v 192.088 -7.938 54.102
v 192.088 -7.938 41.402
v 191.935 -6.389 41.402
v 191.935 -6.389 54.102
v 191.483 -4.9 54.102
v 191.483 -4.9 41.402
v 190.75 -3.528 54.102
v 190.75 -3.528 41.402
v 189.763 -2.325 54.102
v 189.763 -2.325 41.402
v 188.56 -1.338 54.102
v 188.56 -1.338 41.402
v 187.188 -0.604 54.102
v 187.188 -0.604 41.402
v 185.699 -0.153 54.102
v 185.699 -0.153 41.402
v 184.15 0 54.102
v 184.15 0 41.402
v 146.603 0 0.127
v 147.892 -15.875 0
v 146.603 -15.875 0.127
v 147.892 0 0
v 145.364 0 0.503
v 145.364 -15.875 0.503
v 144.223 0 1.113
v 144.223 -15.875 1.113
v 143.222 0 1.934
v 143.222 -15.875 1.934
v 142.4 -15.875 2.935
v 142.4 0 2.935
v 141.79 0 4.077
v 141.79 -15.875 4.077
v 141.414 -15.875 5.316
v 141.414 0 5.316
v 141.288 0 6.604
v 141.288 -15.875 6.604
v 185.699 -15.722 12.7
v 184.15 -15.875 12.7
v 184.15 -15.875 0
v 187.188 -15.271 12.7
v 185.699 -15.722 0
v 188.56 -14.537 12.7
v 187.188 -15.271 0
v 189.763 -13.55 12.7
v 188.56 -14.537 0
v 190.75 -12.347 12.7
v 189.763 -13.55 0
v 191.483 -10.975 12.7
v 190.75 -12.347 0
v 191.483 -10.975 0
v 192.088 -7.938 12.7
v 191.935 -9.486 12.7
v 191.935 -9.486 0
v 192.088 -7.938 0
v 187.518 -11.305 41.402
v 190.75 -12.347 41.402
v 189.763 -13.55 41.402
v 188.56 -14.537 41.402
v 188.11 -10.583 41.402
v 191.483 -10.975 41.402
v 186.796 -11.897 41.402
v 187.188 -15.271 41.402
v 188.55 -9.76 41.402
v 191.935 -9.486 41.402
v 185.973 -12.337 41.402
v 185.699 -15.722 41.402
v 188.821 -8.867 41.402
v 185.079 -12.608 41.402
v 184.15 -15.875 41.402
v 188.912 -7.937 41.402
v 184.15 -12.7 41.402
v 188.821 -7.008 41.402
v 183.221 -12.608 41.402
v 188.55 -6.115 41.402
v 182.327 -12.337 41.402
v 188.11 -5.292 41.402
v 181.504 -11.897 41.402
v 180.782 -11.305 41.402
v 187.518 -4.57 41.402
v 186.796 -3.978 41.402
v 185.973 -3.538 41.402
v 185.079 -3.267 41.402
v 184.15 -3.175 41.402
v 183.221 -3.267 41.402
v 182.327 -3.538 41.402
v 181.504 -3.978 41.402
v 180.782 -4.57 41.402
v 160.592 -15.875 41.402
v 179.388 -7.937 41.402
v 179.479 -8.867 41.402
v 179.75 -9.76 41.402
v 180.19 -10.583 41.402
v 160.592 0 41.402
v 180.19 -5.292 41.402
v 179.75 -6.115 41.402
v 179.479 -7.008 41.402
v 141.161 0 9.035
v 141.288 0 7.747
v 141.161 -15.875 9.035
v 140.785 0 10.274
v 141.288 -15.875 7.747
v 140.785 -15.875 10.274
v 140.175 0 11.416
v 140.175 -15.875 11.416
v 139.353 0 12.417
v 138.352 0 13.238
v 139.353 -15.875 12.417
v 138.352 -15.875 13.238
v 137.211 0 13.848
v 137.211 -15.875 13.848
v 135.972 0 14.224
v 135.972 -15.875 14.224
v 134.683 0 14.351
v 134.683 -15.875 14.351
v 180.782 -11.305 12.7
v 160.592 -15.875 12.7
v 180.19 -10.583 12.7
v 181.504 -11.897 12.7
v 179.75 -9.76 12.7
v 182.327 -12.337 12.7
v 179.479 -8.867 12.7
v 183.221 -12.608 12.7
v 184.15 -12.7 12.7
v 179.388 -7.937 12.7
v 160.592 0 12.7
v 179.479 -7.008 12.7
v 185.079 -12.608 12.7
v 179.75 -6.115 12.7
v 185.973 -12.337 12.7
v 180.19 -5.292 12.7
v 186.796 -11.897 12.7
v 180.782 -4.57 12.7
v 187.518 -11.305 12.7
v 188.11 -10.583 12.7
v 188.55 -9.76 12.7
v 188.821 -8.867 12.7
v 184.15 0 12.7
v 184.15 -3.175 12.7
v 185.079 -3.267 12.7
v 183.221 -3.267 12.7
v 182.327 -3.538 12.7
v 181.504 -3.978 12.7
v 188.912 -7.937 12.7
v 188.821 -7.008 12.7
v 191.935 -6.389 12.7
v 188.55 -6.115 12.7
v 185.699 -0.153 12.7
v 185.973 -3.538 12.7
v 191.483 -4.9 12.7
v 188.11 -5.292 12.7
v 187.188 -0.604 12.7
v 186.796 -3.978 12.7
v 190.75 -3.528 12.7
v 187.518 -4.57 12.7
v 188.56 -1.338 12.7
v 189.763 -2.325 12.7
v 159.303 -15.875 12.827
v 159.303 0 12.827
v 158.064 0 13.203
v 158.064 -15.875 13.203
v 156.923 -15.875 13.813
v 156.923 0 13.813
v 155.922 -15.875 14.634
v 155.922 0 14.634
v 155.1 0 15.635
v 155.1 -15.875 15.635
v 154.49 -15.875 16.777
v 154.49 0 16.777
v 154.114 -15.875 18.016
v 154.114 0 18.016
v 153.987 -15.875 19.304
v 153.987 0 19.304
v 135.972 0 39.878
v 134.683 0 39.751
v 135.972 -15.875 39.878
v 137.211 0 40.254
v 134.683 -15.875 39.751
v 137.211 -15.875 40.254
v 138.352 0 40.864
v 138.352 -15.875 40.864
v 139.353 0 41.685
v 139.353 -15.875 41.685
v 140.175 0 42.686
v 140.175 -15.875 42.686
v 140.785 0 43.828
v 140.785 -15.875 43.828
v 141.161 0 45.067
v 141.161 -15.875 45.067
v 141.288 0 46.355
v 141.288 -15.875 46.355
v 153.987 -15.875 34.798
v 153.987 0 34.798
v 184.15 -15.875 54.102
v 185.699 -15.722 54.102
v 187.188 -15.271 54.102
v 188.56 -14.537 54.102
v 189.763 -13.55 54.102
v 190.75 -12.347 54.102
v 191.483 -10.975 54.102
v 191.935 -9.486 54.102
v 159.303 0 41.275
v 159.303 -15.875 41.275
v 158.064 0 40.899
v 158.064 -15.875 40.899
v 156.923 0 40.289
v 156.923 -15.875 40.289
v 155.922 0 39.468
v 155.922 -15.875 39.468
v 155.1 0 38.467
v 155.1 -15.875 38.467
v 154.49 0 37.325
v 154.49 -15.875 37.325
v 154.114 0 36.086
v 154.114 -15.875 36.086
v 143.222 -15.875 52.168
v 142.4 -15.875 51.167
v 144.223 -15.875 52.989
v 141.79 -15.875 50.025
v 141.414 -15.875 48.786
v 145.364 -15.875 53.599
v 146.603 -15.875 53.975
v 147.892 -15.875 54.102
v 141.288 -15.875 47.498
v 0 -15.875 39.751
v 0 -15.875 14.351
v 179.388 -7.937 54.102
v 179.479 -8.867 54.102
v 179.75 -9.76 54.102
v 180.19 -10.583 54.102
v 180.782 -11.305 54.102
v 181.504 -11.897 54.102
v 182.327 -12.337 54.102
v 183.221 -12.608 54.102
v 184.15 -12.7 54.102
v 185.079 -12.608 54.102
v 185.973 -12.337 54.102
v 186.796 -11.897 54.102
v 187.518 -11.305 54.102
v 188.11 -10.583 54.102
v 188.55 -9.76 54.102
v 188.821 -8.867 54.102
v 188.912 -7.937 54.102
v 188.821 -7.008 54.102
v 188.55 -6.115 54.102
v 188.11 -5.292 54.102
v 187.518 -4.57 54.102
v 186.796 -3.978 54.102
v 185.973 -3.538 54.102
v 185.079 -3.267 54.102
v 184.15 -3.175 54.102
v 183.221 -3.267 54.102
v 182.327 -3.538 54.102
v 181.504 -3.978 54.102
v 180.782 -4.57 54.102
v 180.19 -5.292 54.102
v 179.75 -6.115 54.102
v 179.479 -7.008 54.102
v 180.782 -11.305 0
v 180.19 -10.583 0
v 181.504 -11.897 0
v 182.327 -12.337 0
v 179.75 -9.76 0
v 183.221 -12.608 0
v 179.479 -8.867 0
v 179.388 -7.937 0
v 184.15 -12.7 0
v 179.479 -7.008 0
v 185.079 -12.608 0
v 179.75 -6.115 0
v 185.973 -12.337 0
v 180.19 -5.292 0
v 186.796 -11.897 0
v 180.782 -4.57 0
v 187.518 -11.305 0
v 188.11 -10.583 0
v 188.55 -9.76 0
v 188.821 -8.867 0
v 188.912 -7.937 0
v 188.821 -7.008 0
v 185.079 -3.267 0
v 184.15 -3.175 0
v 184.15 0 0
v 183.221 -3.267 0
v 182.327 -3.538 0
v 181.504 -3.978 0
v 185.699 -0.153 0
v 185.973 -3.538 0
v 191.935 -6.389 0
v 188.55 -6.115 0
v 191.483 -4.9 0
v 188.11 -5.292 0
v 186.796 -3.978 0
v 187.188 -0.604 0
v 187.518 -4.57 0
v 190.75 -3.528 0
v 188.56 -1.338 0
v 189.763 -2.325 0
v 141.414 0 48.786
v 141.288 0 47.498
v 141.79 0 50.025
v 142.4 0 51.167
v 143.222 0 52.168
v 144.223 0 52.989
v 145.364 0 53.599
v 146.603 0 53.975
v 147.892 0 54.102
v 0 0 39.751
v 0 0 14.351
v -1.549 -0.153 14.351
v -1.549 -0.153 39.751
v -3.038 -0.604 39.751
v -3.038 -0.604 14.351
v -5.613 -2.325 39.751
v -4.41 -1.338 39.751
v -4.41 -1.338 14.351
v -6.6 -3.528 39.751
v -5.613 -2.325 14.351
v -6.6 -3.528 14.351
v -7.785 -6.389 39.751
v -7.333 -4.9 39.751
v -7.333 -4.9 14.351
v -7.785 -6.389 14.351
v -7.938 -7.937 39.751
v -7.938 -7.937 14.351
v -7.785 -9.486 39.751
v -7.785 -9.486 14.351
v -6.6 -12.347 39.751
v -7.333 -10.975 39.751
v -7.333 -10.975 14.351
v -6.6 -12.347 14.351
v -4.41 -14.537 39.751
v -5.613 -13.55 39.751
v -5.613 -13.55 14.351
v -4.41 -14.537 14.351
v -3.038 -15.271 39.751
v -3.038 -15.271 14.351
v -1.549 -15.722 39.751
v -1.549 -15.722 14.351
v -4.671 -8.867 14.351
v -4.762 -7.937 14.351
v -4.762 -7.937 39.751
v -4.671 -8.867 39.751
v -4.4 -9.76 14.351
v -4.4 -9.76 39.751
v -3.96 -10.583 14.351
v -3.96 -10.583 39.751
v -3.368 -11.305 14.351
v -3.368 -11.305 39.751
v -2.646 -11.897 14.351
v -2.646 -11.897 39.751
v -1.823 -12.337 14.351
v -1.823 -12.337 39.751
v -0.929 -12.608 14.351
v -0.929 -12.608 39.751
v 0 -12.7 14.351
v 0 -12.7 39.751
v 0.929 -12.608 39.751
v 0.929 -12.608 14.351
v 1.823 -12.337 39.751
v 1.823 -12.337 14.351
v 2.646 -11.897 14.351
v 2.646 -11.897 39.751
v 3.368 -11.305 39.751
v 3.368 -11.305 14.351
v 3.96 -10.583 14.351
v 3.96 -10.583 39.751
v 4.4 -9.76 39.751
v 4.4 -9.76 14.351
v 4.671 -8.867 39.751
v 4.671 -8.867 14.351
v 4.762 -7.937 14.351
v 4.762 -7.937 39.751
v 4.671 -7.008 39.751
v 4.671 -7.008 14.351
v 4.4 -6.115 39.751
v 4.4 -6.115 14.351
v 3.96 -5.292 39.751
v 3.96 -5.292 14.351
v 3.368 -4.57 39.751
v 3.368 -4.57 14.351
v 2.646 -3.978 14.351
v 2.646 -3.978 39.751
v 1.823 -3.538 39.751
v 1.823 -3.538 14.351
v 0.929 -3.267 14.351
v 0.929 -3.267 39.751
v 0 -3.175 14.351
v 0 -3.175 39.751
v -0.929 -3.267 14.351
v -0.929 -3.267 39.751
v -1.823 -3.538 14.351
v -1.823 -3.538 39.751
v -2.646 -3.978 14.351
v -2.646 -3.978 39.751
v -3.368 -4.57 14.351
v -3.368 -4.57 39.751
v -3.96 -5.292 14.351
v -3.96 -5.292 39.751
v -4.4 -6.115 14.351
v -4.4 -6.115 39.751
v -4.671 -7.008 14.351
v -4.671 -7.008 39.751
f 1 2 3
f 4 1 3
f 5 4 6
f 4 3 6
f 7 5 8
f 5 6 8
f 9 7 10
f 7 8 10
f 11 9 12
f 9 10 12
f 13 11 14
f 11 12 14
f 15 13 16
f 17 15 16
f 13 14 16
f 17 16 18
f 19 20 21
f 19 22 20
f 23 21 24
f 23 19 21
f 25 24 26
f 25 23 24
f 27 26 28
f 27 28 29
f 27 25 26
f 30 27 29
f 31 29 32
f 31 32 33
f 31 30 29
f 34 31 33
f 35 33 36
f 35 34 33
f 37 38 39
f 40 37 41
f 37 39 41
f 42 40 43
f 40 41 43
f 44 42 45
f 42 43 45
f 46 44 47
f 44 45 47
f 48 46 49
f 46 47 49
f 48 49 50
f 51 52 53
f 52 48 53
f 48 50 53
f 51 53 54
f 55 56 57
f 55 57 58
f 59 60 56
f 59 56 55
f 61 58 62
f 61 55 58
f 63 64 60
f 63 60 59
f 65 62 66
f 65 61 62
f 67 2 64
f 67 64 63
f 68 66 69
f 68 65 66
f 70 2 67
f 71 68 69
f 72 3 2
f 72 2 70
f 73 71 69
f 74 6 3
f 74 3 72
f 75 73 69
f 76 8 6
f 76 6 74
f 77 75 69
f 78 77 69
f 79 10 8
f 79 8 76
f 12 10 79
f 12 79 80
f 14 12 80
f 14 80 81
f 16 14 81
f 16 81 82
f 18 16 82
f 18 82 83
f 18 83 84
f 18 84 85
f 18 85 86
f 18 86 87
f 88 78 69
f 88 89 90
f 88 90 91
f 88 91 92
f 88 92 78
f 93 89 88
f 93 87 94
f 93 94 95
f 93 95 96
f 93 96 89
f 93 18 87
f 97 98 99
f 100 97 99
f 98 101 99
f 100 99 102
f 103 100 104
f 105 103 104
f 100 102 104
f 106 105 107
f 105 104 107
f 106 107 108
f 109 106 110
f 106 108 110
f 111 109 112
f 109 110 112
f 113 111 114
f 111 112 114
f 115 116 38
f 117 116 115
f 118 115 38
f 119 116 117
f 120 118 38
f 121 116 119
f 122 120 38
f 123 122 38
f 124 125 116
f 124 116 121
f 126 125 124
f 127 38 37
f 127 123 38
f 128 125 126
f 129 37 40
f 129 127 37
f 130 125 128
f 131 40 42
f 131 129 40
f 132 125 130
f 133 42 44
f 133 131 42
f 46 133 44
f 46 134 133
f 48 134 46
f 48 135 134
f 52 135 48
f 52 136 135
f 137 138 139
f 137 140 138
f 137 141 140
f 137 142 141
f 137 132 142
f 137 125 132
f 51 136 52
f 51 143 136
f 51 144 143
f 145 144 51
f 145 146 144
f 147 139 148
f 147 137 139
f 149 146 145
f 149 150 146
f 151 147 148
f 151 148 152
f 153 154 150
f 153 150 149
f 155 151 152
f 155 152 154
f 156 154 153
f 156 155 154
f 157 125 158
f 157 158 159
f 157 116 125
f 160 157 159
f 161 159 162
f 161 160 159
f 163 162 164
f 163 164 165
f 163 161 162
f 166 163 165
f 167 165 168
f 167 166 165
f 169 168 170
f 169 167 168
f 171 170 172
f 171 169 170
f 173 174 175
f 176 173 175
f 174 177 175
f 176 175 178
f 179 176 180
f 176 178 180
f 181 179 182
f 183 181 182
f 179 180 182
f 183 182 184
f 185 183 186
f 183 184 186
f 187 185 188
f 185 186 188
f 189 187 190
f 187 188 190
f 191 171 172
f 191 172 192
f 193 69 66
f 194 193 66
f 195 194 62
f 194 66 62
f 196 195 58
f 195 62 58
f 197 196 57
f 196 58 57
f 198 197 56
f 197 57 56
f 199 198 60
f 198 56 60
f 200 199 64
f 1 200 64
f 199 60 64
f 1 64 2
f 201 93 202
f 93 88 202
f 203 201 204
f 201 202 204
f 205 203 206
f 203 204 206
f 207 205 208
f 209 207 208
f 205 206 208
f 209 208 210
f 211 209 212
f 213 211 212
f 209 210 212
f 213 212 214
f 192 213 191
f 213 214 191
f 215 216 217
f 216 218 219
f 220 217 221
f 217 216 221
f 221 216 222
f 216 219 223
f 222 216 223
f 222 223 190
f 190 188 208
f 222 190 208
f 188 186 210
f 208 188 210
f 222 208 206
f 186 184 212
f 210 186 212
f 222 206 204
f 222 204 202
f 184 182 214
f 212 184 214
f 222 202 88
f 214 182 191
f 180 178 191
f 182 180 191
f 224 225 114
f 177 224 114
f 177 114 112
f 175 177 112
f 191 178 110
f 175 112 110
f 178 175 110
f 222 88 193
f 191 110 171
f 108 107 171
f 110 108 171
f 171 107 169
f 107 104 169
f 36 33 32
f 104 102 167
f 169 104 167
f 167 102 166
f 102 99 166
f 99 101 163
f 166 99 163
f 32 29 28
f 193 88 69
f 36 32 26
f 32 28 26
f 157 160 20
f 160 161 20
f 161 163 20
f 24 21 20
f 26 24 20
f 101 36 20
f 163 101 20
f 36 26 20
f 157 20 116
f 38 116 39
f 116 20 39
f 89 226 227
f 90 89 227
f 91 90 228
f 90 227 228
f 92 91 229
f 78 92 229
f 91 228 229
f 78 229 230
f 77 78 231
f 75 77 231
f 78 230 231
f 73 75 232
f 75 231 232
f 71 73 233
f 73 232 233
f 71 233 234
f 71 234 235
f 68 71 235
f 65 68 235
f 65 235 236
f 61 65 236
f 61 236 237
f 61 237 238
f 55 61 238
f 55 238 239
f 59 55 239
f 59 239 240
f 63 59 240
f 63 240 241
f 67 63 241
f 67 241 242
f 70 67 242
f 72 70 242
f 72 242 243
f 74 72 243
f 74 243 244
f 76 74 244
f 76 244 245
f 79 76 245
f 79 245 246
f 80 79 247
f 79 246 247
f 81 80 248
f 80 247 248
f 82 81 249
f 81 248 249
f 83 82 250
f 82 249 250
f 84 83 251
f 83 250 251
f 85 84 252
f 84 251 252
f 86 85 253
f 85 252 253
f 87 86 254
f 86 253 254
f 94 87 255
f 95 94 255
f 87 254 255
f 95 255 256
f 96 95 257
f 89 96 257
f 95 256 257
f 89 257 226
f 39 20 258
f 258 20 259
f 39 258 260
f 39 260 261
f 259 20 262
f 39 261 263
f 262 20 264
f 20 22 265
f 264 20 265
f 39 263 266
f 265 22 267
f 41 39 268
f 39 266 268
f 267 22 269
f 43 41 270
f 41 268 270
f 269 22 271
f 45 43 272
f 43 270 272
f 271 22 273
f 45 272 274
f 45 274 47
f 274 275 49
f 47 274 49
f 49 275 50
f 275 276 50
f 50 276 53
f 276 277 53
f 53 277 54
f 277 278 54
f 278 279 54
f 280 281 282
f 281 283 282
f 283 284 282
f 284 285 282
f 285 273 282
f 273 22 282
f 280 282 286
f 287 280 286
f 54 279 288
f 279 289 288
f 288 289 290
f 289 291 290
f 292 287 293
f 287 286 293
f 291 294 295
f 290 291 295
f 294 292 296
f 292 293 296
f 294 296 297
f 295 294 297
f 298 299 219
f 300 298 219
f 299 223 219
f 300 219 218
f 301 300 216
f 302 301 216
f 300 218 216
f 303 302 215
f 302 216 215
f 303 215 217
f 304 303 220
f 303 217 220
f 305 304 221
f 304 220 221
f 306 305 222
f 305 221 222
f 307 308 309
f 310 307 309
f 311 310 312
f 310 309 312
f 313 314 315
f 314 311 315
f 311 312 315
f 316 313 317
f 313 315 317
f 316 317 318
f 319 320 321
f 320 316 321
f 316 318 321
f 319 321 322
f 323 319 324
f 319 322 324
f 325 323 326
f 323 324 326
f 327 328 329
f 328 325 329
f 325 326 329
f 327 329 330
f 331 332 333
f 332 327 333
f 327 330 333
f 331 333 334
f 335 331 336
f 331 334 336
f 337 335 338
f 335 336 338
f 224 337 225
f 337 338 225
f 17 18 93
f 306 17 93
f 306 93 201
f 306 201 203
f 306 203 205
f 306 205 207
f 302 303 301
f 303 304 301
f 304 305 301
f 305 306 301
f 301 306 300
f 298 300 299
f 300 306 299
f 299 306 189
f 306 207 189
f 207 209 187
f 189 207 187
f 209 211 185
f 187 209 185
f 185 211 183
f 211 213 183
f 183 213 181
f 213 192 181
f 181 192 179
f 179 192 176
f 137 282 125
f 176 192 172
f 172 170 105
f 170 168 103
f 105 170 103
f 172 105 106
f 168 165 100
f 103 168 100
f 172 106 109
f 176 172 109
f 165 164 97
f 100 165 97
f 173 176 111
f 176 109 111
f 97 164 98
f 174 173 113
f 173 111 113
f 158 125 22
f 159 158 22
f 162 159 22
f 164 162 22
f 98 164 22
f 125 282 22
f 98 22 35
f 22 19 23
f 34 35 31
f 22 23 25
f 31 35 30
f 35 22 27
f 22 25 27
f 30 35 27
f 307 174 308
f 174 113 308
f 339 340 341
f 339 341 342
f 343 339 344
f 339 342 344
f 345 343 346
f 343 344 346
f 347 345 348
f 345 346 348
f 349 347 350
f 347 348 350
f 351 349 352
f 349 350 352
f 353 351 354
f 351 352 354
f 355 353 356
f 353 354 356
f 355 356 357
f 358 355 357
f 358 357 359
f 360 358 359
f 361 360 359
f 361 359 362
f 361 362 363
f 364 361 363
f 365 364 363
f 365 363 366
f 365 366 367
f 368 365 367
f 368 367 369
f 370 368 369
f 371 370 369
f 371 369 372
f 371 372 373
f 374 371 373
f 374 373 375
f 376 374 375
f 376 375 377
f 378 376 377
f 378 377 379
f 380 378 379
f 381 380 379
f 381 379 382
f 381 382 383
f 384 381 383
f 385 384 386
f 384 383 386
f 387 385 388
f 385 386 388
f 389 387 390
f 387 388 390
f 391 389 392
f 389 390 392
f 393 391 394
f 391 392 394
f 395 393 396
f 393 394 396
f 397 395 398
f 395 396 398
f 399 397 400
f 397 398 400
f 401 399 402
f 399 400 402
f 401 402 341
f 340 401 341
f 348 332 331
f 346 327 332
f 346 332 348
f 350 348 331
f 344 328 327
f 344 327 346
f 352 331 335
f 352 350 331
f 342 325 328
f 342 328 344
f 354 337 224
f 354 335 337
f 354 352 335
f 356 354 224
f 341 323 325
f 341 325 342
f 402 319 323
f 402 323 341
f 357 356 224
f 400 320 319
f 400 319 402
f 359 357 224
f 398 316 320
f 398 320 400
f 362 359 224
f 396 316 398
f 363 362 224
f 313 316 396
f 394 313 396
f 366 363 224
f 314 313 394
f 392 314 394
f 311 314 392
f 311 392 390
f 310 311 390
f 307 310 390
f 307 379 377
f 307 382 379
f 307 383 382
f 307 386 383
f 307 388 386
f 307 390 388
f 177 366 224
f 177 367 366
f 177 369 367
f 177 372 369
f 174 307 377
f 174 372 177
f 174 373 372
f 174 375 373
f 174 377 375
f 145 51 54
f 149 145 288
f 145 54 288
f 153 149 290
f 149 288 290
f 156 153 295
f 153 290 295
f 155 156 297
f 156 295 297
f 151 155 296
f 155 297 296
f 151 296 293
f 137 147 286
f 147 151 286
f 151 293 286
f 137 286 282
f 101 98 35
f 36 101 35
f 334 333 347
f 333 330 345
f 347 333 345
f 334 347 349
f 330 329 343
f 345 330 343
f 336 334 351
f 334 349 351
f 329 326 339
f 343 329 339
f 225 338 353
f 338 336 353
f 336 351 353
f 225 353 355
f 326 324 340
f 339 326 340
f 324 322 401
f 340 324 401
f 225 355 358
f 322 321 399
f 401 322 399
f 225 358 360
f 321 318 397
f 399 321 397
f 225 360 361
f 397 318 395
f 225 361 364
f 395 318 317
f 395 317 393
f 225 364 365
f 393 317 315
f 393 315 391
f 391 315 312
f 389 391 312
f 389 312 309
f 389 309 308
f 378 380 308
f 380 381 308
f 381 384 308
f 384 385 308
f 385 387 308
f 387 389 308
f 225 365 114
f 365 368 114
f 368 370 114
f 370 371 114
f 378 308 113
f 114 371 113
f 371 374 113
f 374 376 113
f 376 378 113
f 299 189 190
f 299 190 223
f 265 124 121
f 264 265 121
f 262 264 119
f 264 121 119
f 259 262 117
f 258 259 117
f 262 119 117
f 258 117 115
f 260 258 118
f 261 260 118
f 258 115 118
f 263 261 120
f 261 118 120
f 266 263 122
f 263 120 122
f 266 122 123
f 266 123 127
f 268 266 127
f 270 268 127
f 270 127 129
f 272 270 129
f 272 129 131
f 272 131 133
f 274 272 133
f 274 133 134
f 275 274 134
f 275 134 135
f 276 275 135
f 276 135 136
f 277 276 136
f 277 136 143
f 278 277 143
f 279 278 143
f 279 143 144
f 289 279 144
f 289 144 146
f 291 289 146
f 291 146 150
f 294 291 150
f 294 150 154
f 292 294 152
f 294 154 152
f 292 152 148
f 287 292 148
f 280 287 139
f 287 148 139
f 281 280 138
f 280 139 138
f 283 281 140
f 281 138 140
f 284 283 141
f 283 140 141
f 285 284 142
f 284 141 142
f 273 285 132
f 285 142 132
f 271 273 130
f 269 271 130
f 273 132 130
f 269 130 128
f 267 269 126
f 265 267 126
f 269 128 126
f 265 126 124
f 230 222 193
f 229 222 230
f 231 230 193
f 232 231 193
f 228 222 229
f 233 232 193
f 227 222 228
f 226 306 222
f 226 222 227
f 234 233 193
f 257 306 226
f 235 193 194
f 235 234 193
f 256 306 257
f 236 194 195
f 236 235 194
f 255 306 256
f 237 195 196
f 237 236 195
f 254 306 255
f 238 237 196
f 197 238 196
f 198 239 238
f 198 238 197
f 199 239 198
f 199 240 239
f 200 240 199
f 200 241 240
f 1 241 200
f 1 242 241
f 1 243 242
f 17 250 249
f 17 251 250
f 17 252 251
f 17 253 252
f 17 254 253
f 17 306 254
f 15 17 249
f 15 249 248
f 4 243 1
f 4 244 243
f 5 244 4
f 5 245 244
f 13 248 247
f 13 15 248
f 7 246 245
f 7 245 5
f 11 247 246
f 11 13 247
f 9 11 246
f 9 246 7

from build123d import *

# Parameters (mm, degrees)
F1_DEPTH = 54.102
F2_D     = 9.525
F3_W     = 25.4
F3_H     = 28.702
F3_W_2   = 38.1
F4_DEPTH = 25.4
F5_R     = 6.604
F6_W     = 141.2875
F6_H     = 14.351
F6_W_2   = 7.9375
F7_DEPTH = 25.4
F9_R     = 6.604


# Not quite as in the source:
# - a pattern or mirror of a feature is missing from the dataset's text; its kind, count and spacing are read off the source's solid


with BuildPart() as f1:
    # F0 (on Top) → F1 (new body)
    with BuildSketch(Plane.XY):
        with BuildLine():
            ThreePointArc((192.0875, -7.9375), (189.7626600757, -2.3248399243), (184.15, 0))
            Line((184.15, 0), (184.15, -15.875))
            ThreePointArc((184.15, -15.875), (189.7626600757, -13.5501600757), (192.0875, -7.9375))
        make_face()
        with BuildLine():
            Line((184.15, -15.875), (184.15, 0))
            ThreePointArc((184.15, 0), (176.2125, -7.9375), (184.15, -15.875))
        make_face()
        with BuildLine():
            Line((184.15, 0), (0, 0))
            ThreePointArc((0, 0), (5.6126600757, -2.3248399243), (7.9375, -7.9375))
            ThreePointArc((7.9375, -7.9375), (5.6126600757, -13.5501600757), (0, -15.875))
            Line((0, -15.875), (184.15, -15.875))
            ThreePointArc((184.15, -15.875), (176.2125, -7.9375), (184.15, 0))
        make_face()
        with BuildLine():
            ThreePointArc((7.9375, -7.9375), (5.6126600757, -2.3248399243), (0, 0))
            Line((0, 0), (0, -15.875))
            ThreePointArc((0, -15.875), (5.6126600757, -13.5501600757), (7.9375, -7.9375))
        make_face()
        with BuildLine():
            Line((0, -15.875), (0, 0))
            ThreePointArc((0, 0), (-7.9375, -7.9375), (0, -15.875))
        make_face()
    extrude(amount=F1_DEPTH)

    # F2 (through all)
    with Locations(Plane(origin=(0, 0, 0), x_dir=(1, 0, 0), z_dir=(0, 0, -1))):
        with Locations((0, 7.9375), (184.15, 7.9375)):
            Hole(F2_D / 2)

    # F3 (on Front) → F4 (cut)
    with BuildSketch(Plane.XZ):
        with Locations((204.7875, 27.051)):
            Rectangle(F3_W, F3_H)
        with Locations((173.0375, 27.051)):
            Rectangle(F3_W_2, F3_H)
    extrude(amount=F4_DEPTH, mode=Mode.SUBTRACT)

    # F5
    f5_edges = [f1.edges().sort_by_distance(p)[0] for p in [
        (153.9875, -7.9375, 41.402),
        (153.9875, -7.9375, 12.7),
    ]]
    fillet(f5_edges, radius=F5_R)

    # F6 (on Front) → F7 (cut)
    with BuildSketch(Plane.XZ):
        with Locations((70.64375, 46.9265)):
            Rectangle(F6_W, F6_H)
        with Locations((-3.96875, 46.9265)):
            Rectangle(F6_W_2, F6_H)
        Polygon((-20.6375, 39.751), (-7.9375, 39.751), (-7.9375, 54.102), (0, 54.102), (141.2875, 54.102), (141.2875, 66.802), (-20.6375, 66.802), align=None)
    f7 = extrude(amount=F7_DEPTH, mode=Mode.SUBTRACT)

    # F7_copies: F7 across plane
    add(f7.mirror(Plane(origin=(0, 0, 27.051), x_dir=(-1, 0, 0), z_dir=(0, 0, -1))), mode=Mode.SUBTRACT)

    # F9
    f9_edges = [f1.edges().sort_by_distance(p)[0] for p in [
        (141.2875, -7.9375, 39.751),
        (141.2875, -7.9375, 54.102),
        (141.2875, -7.9375, 0),
        (141.2875, -7.9375, 14.351),
    ]]
    fillet(f9_edges, radius=F9_R)


solid = f1.part
